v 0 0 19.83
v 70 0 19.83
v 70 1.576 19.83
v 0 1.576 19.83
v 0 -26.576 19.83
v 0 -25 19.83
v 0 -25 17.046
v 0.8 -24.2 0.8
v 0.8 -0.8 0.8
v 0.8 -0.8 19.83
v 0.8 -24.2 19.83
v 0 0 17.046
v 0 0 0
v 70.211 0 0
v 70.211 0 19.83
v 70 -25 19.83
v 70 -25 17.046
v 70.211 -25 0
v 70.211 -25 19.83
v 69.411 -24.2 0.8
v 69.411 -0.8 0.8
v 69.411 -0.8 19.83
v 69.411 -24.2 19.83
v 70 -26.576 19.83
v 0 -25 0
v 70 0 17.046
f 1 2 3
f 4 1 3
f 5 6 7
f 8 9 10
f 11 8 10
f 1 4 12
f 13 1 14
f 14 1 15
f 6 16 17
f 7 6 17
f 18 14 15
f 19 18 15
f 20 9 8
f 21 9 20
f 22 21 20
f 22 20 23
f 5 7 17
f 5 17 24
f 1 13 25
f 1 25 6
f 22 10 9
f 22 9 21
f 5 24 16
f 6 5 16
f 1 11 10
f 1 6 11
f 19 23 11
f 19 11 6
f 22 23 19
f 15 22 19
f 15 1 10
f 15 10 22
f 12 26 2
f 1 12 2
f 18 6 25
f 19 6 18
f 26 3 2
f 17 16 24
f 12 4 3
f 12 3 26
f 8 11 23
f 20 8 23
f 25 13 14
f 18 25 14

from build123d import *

# Parameters (mm, degrees)
F0_W     = 70.210844
F0_H     = 19.829821
F1_DEPTH = 25
F2_T     = -0.8
F4_DEPTH = 70


with BuildPart() as f1:
    # F0 (on Front) → F1 (new body)
    with BuildSketch(Plane.XZ):
        with Locations((35.105422, 9.91491)):
            Rectangle(F0_W, F0_H)
    extrude(amount=F1_DEPTH)

    # F2
    f2_openings = [f1.faces().sort_by_distance(p)[0] for p in [
        (35.105422, -12.5, 19.829821),
    ]]
    offset(amount=F2_T, openings=f2_openings)


with BuildPart() as f4:
    # F3 (on face) → F4 (new body)
    with BuildSketch(Plane(origin=(0, 0, 0), x_dir=(0, -1, 0), z_dir=(-1, 0, 0))):
        Polygon((26.576297, 19.829821), (25, 19.829821), (25, 17.046046), align=None)
        Polygon((0, 17.046046), (0, 19.829821), (-1.576297, 19.829821), align=None)
    extrude(amount=-F4_DEPTH)


solid = Compound([f1.part, f4.part])
